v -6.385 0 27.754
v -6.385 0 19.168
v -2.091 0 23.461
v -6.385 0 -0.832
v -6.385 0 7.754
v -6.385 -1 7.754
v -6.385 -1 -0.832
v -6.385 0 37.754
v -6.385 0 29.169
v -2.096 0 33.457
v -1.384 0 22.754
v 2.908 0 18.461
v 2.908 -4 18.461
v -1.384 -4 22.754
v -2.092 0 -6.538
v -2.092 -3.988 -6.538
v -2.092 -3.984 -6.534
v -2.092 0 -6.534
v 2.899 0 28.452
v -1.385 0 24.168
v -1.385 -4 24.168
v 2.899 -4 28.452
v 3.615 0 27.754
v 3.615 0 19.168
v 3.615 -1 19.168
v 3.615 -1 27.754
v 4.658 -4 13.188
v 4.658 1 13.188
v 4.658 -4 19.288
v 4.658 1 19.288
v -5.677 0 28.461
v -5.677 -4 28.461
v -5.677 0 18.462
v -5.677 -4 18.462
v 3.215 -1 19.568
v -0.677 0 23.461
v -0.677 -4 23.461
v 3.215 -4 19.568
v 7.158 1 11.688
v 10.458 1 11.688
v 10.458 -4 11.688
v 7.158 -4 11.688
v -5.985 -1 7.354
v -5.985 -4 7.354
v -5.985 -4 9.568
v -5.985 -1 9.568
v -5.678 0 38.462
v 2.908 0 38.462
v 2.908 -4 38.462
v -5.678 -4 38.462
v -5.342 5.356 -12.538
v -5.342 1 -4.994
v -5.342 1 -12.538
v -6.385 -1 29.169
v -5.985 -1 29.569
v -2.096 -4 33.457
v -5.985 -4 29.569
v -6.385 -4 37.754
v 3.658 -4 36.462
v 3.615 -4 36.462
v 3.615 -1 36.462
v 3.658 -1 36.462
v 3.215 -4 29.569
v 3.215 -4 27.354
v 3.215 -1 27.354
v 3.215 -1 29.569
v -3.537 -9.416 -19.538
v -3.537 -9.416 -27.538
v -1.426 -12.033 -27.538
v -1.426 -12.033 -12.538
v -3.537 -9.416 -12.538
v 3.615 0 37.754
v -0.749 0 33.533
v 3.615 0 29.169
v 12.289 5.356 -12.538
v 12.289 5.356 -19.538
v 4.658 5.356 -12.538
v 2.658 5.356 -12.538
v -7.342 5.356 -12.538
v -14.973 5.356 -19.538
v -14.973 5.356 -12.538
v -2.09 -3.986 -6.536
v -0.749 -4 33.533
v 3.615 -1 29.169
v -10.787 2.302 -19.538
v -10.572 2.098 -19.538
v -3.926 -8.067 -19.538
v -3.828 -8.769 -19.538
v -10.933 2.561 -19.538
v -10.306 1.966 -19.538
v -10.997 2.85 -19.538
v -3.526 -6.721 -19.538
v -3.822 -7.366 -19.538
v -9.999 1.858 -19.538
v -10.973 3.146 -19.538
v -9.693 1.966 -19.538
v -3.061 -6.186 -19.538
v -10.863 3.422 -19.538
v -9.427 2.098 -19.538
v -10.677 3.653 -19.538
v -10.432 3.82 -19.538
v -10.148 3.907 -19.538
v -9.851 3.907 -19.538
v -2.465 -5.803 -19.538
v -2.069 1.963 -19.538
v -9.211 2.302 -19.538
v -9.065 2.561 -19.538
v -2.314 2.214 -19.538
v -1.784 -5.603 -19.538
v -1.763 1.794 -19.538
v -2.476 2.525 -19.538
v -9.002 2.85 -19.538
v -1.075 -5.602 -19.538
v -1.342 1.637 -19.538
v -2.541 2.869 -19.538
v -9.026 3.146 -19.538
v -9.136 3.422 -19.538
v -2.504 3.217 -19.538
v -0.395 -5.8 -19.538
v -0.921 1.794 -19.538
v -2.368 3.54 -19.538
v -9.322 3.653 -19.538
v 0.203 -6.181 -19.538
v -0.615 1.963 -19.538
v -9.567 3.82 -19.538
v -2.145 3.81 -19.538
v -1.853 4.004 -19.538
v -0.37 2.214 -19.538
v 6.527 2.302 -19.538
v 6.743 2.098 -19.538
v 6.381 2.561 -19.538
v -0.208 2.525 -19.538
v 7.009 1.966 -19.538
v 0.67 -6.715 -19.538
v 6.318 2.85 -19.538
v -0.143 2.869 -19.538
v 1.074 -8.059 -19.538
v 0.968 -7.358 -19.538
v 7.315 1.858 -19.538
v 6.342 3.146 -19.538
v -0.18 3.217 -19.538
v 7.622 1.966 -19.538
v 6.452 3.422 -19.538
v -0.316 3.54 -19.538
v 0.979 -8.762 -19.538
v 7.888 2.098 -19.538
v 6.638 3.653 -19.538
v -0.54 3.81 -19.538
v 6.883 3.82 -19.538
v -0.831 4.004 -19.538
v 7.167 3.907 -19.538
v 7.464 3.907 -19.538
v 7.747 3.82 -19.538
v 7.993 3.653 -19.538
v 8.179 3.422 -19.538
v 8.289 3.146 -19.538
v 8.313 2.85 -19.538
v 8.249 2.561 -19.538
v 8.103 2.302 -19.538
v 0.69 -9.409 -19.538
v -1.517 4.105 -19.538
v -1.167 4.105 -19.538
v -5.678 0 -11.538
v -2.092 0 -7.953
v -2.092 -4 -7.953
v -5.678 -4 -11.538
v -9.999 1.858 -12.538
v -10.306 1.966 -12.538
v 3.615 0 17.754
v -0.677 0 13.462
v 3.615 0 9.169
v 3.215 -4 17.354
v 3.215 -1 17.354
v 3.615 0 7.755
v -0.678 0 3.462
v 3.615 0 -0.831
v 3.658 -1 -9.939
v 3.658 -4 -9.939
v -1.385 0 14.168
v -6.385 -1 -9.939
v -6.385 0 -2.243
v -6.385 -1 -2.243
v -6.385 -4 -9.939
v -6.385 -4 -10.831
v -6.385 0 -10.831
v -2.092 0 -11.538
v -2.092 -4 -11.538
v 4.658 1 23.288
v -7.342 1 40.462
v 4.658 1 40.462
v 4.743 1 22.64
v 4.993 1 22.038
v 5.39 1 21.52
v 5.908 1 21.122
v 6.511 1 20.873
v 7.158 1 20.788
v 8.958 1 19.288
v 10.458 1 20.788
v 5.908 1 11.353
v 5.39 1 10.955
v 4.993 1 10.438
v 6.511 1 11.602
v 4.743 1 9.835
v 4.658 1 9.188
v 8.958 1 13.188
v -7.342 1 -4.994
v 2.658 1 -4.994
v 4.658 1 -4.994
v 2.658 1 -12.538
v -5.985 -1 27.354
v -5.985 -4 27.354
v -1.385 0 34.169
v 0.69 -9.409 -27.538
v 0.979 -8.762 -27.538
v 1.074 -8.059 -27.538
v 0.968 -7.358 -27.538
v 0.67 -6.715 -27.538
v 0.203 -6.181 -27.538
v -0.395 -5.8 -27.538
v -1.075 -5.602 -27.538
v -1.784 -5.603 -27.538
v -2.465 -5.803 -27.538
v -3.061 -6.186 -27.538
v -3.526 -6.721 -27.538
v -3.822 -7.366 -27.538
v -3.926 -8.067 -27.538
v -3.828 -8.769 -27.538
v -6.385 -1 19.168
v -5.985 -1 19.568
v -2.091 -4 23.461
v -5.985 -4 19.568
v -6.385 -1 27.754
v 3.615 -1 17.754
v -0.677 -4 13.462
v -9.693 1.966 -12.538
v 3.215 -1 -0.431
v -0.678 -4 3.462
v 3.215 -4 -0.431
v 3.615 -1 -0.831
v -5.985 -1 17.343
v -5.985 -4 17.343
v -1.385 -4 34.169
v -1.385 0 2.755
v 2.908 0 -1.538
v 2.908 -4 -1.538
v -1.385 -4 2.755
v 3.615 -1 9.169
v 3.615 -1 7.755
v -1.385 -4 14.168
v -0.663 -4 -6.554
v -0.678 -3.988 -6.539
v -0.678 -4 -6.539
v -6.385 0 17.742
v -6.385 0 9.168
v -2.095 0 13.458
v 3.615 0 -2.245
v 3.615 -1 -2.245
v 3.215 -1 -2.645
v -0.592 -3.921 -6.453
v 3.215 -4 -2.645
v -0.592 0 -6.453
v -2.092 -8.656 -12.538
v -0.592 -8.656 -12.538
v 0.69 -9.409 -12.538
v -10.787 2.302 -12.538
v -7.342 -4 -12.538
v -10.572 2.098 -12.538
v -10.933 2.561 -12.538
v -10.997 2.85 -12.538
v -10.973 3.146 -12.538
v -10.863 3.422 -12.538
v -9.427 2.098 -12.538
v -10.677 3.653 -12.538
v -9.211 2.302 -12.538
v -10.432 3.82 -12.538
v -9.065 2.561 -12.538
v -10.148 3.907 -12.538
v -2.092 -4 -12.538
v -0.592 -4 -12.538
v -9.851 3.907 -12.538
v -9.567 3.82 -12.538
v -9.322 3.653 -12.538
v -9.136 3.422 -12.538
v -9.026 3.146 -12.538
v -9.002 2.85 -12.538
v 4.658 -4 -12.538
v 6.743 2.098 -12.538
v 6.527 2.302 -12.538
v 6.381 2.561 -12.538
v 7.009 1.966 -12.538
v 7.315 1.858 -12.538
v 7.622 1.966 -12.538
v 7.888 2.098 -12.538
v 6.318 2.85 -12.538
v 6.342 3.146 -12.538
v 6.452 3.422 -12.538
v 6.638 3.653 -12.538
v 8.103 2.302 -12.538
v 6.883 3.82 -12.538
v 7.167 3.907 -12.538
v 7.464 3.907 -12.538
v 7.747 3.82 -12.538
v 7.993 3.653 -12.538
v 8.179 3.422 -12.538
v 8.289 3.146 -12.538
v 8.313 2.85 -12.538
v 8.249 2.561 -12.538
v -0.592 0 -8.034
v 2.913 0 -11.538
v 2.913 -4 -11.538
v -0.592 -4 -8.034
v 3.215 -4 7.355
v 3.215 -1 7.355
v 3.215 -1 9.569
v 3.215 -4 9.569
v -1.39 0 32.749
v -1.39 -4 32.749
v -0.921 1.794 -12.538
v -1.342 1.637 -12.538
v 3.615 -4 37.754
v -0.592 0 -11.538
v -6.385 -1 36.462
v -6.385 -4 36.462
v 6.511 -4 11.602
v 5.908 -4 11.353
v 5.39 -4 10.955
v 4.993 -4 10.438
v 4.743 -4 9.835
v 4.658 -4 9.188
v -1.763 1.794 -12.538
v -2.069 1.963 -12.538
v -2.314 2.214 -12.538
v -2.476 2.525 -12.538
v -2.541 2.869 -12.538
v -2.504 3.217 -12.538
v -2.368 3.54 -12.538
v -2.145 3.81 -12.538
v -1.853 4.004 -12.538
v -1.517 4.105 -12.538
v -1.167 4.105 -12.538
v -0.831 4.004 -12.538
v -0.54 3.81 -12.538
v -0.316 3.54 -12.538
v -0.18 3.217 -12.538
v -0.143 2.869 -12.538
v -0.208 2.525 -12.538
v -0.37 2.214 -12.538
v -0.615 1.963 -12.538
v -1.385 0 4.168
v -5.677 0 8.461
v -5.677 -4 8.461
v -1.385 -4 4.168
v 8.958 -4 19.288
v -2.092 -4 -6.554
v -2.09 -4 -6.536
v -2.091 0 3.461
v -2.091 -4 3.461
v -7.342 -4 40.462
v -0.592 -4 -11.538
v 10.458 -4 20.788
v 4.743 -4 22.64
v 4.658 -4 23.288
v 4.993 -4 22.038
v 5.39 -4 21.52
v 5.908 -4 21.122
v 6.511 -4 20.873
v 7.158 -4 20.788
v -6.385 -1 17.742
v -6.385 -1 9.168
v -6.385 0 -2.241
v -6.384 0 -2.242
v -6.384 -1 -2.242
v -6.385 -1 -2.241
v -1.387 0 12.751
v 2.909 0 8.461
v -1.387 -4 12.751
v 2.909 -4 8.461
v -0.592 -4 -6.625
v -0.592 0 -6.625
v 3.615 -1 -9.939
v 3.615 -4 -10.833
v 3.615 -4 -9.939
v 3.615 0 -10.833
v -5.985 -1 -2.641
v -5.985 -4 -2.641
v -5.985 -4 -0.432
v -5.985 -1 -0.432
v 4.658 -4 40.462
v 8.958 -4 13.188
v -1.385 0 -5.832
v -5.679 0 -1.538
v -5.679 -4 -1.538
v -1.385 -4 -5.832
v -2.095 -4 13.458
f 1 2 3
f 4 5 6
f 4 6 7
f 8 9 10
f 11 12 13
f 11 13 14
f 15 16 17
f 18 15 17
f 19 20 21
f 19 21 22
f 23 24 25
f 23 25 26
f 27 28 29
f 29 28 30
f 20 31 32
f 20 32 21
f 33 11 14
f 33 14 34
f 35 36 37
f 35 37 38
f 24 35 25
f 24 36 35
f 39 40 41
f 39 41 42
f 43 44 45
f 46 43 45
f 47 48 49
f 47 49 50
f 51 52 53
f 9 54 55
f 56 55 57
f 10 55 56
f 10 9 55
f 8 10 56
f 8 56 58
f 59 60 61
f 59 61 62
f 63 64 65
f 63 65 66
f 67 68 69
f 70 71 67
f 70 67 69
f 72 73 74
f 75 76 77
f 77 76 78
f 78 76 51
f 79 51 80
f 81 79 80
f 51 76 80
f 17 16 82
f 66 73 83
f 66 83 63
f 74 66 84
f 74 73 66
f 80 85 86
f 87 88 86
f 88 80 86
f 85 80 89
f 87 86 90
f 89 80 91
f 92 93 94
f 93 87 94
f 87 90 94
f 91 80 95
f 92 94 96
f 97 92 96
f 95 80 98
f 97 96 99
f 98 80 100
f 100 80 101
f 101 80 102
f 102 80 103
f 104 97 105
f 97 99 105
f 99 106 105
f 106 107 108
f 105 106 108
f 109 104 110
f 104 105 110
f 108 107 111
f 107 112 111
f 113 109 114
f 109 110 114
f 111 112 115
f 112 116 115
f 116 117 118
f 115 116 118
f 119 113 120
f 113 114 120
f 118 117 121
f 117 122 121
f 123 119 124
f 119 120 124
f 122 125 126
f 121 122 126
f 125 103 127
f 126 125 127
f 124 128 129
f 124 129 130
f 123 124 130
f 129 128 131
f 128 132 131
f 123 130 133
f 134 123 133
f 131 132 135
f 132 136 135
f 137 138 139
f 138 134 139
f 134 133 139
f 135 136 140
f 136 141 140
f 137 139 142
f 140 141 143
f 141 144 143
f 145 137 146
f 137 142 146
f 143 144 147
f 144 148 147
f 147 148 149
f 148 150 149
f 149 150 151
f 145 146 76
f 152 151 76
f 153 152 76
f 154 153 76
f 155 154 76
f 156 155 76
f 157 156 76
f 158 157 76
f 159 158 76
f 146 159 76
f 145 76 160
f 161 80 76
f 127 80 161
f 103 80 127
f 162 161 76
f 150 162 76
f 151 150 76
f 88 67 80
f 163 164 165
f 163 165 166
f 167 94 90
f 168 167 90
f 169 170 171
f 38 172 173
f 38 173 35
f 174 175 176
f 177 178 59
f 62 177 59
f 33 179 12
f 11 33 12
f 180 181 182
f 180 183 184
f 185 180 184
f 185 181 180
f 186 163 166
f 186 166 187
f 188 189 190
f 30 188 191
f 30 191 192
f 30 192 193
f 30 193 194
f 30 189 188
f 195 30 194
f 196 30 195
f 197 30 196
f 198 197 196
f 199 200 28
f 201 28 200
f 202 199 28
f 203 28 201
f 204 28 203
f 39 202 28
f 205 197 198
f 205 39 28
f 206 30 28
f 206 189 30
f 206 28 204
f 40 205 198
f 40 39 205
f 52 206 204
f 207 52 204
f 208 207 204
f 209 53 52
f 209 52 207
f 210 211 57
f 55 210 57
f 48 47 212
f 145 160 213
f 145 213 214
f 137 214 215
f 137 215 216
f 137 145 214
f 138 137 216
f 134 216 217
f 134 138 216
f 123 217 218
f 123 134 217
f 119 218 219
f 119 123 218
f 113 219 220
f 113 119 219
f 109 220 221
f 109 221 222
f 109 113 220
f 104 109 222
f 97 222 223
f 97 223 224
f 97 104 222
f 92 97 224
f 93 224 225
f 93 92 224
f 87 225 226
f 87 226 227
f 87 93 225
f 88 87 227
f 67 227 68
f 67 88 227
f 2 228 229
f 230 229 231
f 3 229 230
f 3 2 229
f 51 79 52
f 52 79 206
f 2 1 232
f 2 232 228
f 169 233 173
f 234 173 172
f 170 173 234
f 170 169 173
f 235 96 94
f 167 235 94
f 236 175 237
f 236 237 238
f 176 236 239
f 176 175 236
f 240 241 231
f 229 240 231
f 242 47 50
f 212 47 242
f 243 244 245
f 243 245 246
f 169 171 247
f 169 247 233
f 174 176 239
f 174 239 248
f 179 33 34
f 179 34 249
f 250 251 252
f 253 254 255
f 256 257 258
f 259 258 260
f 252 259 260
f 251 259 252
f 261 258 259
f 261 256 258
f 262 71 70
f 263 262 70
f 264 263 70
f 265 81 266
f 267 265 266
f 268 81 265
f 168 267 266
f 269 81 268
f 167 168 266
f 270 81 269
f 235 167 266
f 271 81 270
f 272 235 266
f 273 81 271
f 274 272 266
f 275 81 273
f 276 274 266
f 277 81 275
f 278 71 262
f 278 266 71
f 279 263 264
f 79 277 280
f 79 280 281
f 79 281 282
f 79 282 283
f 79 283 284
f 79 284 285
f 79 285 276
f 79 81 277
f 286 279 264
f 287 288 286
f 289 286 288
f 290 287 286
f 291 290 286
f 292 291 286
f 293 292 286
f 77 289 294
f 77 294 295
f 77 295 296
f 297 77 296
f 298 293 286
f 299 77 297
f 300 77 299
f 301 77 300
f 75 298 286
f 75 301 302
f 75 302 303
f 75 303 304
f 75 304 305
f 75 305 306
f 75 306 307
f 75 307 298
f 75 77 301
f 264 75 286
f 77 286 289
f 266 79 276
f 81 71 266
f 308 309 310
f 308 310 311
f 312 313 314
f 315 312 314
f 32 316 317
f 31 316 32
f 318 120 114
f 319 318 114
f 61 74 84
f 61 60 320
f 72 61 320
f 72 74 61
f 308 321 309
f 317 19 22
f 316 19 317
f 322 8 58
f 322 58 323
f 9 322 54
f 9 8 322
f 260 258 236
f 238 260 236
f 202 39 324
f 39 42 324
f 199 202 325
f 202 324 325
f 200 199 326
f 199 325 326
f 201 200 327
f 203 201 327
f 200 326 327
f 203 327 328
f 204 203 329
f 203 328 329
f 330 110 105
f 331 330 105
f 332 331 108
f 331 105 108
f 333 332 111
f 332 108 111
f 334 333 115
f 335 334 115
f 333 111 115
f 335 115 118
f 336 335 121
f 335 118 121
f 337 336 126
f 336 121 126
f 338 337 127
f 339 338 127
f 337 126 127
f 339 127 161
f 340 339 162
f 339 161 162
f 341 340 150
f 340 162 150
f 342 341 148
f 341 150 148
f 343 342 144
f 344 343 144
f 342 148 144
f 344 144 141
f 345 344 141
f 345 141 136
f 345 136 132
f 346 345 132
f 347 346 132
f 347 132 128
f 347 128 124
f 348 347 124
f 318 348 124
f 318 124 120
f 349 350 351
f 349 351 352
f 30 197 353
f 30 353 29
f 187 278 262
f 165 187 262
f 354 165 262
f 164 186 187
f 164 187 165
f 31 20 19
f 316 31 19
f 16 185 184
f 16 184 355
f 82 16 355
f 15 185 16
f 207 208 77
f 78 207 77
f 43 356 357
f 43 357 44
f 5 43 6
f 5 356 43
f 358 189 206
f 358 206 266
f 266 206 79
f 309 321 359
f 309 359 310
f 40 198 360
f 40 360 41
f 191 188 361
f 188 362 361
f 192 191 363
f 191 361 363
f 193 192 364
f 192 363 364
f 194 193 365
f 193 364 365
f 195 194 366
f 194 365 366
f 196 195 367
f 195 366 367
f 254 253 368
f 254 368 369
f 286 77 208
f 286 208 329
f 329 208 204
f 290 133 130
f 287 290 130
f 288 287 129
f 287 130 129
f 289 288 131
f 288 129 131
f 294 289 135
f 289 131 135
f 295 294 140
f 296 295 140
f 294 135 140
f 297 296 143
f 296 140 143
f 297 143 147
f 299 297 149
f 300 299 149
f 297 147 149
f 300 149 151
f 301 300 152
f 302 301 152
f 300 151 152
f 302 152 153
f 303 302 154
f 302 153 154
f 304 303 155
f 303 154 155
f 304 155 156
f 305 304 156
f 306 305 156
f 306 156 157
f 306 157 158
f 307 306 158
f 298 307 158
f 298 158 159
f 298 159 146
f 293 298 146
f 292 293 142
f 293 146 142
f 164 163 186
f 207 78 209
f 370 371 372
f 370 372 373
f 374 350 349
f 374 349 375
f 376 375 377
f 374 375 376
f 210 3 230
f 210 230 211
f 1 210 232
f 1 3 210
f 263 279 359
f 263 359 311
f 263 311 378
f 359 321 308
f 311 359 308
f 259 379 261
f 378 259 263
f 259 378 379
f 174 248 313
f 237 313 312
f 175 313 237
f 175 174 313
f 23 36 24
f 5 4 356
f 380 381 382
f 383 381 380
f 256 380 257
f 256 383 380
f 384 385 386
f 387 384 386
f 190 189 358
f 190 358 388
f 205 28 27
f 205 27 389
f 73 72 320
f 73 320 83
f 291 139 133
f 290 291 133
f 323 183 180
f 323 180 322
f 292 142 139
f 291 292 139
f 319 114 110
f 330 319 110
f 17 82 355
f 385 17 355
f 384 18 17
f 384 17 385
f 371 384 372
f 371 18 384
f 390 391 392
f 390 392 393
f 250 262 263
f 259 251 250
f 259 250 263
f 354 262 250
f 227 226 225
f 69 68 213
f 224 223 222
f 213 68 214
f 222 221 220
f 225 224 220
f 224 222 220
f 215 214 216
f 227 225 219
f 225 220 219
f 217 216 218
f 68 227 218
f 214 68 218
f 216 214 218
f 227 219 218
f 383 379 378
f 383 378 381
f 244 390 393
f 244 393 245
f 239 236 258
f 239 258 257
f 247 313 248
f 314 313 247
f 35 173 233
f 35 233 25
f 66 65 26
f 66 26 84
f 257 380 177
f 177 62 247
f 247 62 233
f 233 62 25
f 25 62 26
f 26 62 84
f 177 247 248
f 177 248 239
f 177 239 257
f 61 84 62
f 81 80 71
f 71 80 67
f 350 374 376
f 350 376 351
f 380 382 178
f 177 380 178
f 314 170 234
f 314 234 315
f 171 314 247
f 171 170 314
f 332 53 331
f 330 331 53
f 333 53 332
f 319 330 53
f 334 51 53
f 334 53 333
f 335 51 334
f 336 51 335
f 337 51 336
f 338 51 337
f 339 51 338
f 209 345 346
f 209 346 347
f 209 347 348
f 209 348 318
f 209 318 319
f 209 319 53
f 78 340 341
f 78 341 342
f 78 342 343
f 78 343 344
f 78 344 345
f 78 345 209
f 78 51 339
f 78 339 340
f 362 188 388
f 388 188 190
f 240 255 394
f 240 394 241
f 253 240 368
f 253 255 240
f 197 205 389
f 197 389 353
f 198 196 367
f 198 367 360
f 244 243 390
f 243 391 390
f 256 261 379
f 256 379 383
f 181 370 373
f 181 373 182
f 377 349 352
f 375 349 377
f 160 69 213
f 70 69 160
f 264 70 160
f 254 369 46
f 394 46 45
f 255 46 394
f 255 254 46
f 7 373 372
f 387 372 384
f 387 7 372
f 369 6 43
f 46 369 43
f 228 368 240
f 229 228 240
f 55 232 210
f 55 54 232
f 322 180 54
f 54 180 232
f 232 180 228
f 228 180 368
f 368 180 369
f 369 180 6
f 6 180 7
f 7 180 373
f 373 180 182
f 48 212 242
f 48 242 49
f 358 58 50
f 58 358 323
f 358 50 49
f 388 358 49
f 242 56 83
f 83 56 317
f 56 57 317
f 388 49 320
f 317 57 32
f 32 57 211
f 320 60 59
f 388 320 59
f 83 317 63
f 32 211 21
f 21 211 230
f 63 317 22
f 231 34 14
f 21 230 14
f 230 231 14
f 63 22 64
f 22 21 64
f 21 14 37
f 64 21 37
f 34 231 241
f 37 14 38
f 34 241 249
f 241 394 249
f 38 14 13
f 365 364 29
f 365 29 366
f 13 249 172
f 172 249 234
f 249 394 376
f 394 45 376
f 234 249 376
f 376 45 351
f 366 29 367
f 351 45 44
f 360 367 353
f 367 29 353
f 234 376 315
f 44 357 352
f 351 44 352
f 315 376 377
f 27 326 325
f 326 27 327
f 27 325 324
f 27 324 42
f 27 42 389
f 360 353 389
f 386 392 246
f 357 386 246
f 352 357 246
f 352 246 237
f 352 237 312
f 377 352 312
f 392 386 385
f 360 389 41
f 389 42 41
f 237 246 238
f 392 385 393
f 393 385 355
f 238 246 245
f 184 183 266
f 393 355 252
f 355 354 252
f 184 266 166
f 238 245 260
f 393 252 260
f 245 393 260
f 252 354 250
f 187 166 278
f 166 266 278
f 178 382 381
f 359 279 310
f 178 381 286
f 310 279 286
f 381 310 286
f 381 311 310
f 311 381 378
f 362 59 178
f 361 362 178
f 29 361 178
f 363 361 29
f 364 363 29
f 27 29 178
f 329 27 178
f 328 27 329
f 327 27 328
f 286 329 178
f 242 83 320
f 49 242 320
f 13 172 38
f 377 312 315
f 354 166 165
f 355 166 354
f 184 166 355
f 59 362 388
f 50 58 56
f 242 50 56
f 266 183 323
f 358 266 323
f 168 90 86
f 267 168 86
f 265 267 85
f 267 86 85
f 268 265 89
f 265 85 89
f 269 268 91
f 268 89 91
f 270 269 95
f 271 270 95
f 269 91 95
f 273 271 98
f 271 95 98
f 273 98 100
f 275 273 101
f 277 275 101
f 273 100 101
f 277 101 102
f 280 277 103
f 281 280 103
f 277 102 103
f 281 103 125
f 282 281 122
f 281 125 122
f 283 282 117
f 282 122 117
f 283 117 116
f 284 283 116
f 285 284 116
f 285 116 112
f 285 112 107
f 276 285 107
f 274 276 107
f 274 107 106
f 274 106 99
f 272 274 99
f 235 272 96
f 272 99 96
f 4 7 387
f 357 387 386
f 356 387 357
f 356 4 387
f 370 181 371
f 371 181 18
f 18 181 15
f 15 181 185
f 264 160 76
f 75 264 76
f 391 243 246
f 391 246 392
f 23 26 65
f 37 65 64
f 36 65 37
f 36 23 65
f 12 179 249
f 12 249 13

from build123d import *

# Parameters (mm, degrees)
SKETCH1_W            = 12
SKETCH1_H            = 60
BOSS_EXTRUDE1_DEPTH  = 1
SKETCH4_W            = 12
SKETCH4_H            = 60
BOSS_EXTRUDE5_DEPTH  = 4
SKETCH3_W            = 0.442585723
SKETCH3_H            = 46.400729484
SKETCH3_W_2          = 0.4
CUT_EXTRUDE1_DEPTH   = 3
BOSS_EXTRUDE6_DEPTH  = 7
BOSS_EXTRUDE11_DEPTH = 8
BOSS_EXTRUDE12_DEPTH = 2
BOSS_EXTRUDE13_DEPTH = 0.75
BOSS_EXTRUDE15_DEPTH = 2
BOSS_EXTRUDE16_DEPTH = 5
FILLET1_R            = 2.5
FILLET2_R            = 2.5


with BuildPart() as part:
    # Sketch1 → Boss-Extrude1 (new body)
    with BuildSketch(Plane(origin=(0, 0, 0), x_dir=(1, 0, 0), z_dir=(0, 1, 0))):
        with Locations((-1.342029662, -10.461538462)):
            Rectangle(SKETCH1_W, SKETCH1_H)
    extrude(amount=BOSS_EXTRUDE1_DEPTH)

    # Sketch4 → Boss-Extrude5 (add)
    with BuildSketch(Plane(origin=(0, 0, 0), x_dir=(1, 0, 0), z_dir=(0, 1, 0))):
        with Locations((-1.342029662, -10.461538462)):
            Rectangle(SKETCH4_W, SKETCH4_H)
        Polygon((-2.096130055, -33.457130572), (-6.384615385, -37.75443168), (-6.384611455, -29.168649172), align=None, mode=Mode.SUBTRACT)
        Polygon((2.908277834, -38.461538462), (-5.677508603, -38.461538462), (-1.384615385, -34.168645243), align=None, mode=Mode.SUBTRACT)
        Polygon((-1.38975443, -32.749302861), (-5.677336591, -28.461186458), (-1.384615385, -24.168121227), (2.898997747, -28.451734358), align=None, mode=Mode.SUBTRACT)
        Polygon((-2.091498793, -23.461237818), (-6.384610808, -27.754427103), (-6.384606877, -19.168129734), align=None, mode=Mode.SUBTRACT)
        Polygon((-1.384401984, -22.754128282), (-5.676963509, -18.461572954), (-1.384618257, -14.16814285), (2.90844487, -18.461204162), align=None, mode=Mode.SUBTRACT)
        Polygon((-2.094846949, -13.457914458), (-6.38460623, -17.742175237), (-6.38460623, -9.168156991), align=None, mode=Mode.SUBTRACT)
        Polygon((3.615384615, -29.168645243), (3.615384615, -37.75443168), (-0.749170508, -33.533200366), align=None, mode=Mode.SUBTRACT)
        Polygon((3.615384615, -19.168465252), (3.615384615, -27.753907665), (-0.677336591, -23.461186458), align=None, mode=Mode.SUBTRACT)
        Polygon((3.615384615, -17.754251693), (-0.676897524, -13.461506969), (3.615384615, -9.169224829), align=None, mode=Mode.SUBTRACT)
        Polygon((-6.384597723, 0.832144172), (-2.091409836, -3.461043715), (-6.384601653, -7.753916614), align=None, mode=Mode.SUBTRACT)
        Polygon((2.908517821, -8.460971372), (-1.387204346, -12.751178894), (-5.677010576, -8.461229413), (-1.384615385, -4.167838166), align=None, mode=Mode.SUBTRACT)
        Polygon((-1.385221722, -2.75490806), (-5.679497842, 1.537745361), (-1.38541394, 5.831829263), (2.908210299, 1.538205024), align=None, mode=Mode.SUBTRACT)
        Polygon((-2.089578329, 6.535993652), (-6.3837953, 2.241776681), (-6.384597078, 2.240974904), (-6.384597078, 2.242578156), (-6.384593146, 10.83100847), align=None, mode=Mode.SUBTRACT)
        Polygon((-5.677832652, 11.538461538), (2.912889557, 11.538461538), (-1.382471548, 7.243100433), align=None, mode=Mode.SUBTRACT)
        Polygon((3.615384615, -7.755011267), (-0.677821818, -3.462040655), (3.615384615, 0.831165778), align=None, mode=Mode.SUBTRACT)
        Polygon((3.615384615, 2.245379341), (-0.678307159, 6.538936044), (3.615384615, 10.832627818), align=None, mode=Mode.SUBTRACT)
    extrude(amount=-BOSS_EXTRUDE5_DEPTH)

    # Sketch3 → Cut-Extrude1 (cut)
    with BuildSketch(Plane.XZ.offset(4)):
        with Locations((3.436677476, 13.26117372)):
            Rectangle(SKETCH3_W, SKETCH3_H)
        with Locations((-6.184615385, 13.26117372)):
            Rectangle(SKETCH3_W_2, SKETCH3_H)
    extrude(amount=-CUT_EXTRUDE1_DEPTH, mode=Mode.SUBTRACT)

    # Sketch5 → Boss-Extrude6 (add)
    with BuildSketch(Plane(origin=(0, 0, -19.538461538), x_dir=(-1, 0, 0), z_dir=(0, 0, -1))):
        Polygon((-12.288789064, 5.355892869), (14.972848388, 5.355892869), (3.537352374, -9.415920613), (1.425918842, -12.033387248), (-0.689767913, -9.409188123), align=None)
        with BuildLine():
            Line((9.692725832, 1.966121199), (9.999443939, 1.857726092))
            Line((9.999443939, 1.857726092), (10.306162047, 1.966121199))
            ThreePointArc((10.306162047, 1.966121199), (9.999443939, 3.917921599), (9.692725832, 1.966121199))
        make_face(mode=Mode.SUBTRACT)
        with BuildLine():
            Line((-7.622102723, 1.966121199), (-7.315384615, 1.857726092))
            Line((-7.315384615, 1.857726092), (-7.008666508, 1.966121199))
            ThreePointArc((-7.008666508, 1.966121199), (-7.315384615, 3.917921599), (-7.622102723, 1.966121199))
        make_face(mode=Mode.SUBTRACT)
        with BuildLine():
            Line((0.921478569, 1.79402802), (1.342029662, 1.636661499))
            Line((1.342029662, 1.636661499), (1.762580755, 1.79402802))
            ThreePointArc((1.762580755, 1.79402802), (1.342029662, 4.117921599), (0.921478569, 1.79402802))
        make_face(mode=Mode.SUBTRACT)
    extrude(amount=-BOSS_EXTRUDE6_DEPTH)

    # Sketch5<3> → Boss-Extrude11 (add)
    with BuildSketch(Plane(origin=(0, 0, -19.538461538), x_dir=(-1, 0, 0), z_dir=(0, 0, -1))):
        with BuildLine():
            Line((3.537352374, -9.415920613), (1.425918842, -12.033387248))
            Line((1.425918842, -12.033387248), (-0.689767913, -9.409188123))
            ThreePointArc((-0.689767913, -9.409188123), (1.429900561, -5.57732435), (3.537352374, -9.415920613))
        make_face()
    extrude(amount=BOSS_EXTRUDE11_DEPTH)

    # Sketch11 → Boss-Extrude12 (add)
    with BuildSketch(Plane.ZY.offset(7.342029662)):
        Polygon((-12.538461538, 5.355892869), (-4.993833778, 1), (-12.538461538, 1), align=None)
    extrude(amount=-BOSS_EXTRUDE12_DEPTH)

    # Sketch12 → Boss-Extrude13 (add, symmetric)
    with BuildSketch(Plane.ZY.offset(1.342029662)):
        Polygon((-13.859142787, 0.316720052), (-13.859142787, -4.418628297), (-13.859142787, -9.68323793), (-6.410996577, -3.888931374), (-6.410996577, 0.316720052), align=None)
    extrude(amount=BOSS_EXTRUDE13_DEPTH, both=True)

    # Sketch14 → Boss-Extrude15 (add)
    with BuildSketch(Plane(origin=(4.657970338, 0, 0), x_dir=(0, 0, -1), z_dir=(1, 0, 0))):
        Polygon((4.993833778, 1), (12.538461538, 5.355892869), (12.538461538, 1), align=None)
    extrude(amount=-BOSS_EXTRUDE15_DEPTH)

    # Sketch15 → Boss-Extrude16 (add)
    with BuildSketch(Plane(origin=(0, 1, 0), x_dir=(1, 0, 0), z_dir=(0, 1, 0))):
        Polygon((4.657970338, -11.687539089), (4.657970338, -13.187539089), (8.957970338, -13.187539089), (8.957970338, -19.287539089), (4.657970338, -19.287539089), (4.657970338, -20.787539089), (10.457970338, -20.787539089), (10.457970338, -11.687539089), align=None)
    extrude(amount=-BOSS_EXTRUDE16_DEPTH)

    # Fillet1
    fillet1_edges = [part.edges().sort_by_distance(p)[0] for p in [
        (4.657970338, -1.5, 20.787539089),
    ]]
    fillet(fillet1_edges, radius=FILLET1_R)

    # Fillet2
    fillet2_edges = [part.edges().sort_by_distance(p)[0] for p in [
        (4.657970338, -1.5, 11.687539089),
    ]]
    fillet(fillet2_edges, radius=FILLET2_R)


solid = part.part
